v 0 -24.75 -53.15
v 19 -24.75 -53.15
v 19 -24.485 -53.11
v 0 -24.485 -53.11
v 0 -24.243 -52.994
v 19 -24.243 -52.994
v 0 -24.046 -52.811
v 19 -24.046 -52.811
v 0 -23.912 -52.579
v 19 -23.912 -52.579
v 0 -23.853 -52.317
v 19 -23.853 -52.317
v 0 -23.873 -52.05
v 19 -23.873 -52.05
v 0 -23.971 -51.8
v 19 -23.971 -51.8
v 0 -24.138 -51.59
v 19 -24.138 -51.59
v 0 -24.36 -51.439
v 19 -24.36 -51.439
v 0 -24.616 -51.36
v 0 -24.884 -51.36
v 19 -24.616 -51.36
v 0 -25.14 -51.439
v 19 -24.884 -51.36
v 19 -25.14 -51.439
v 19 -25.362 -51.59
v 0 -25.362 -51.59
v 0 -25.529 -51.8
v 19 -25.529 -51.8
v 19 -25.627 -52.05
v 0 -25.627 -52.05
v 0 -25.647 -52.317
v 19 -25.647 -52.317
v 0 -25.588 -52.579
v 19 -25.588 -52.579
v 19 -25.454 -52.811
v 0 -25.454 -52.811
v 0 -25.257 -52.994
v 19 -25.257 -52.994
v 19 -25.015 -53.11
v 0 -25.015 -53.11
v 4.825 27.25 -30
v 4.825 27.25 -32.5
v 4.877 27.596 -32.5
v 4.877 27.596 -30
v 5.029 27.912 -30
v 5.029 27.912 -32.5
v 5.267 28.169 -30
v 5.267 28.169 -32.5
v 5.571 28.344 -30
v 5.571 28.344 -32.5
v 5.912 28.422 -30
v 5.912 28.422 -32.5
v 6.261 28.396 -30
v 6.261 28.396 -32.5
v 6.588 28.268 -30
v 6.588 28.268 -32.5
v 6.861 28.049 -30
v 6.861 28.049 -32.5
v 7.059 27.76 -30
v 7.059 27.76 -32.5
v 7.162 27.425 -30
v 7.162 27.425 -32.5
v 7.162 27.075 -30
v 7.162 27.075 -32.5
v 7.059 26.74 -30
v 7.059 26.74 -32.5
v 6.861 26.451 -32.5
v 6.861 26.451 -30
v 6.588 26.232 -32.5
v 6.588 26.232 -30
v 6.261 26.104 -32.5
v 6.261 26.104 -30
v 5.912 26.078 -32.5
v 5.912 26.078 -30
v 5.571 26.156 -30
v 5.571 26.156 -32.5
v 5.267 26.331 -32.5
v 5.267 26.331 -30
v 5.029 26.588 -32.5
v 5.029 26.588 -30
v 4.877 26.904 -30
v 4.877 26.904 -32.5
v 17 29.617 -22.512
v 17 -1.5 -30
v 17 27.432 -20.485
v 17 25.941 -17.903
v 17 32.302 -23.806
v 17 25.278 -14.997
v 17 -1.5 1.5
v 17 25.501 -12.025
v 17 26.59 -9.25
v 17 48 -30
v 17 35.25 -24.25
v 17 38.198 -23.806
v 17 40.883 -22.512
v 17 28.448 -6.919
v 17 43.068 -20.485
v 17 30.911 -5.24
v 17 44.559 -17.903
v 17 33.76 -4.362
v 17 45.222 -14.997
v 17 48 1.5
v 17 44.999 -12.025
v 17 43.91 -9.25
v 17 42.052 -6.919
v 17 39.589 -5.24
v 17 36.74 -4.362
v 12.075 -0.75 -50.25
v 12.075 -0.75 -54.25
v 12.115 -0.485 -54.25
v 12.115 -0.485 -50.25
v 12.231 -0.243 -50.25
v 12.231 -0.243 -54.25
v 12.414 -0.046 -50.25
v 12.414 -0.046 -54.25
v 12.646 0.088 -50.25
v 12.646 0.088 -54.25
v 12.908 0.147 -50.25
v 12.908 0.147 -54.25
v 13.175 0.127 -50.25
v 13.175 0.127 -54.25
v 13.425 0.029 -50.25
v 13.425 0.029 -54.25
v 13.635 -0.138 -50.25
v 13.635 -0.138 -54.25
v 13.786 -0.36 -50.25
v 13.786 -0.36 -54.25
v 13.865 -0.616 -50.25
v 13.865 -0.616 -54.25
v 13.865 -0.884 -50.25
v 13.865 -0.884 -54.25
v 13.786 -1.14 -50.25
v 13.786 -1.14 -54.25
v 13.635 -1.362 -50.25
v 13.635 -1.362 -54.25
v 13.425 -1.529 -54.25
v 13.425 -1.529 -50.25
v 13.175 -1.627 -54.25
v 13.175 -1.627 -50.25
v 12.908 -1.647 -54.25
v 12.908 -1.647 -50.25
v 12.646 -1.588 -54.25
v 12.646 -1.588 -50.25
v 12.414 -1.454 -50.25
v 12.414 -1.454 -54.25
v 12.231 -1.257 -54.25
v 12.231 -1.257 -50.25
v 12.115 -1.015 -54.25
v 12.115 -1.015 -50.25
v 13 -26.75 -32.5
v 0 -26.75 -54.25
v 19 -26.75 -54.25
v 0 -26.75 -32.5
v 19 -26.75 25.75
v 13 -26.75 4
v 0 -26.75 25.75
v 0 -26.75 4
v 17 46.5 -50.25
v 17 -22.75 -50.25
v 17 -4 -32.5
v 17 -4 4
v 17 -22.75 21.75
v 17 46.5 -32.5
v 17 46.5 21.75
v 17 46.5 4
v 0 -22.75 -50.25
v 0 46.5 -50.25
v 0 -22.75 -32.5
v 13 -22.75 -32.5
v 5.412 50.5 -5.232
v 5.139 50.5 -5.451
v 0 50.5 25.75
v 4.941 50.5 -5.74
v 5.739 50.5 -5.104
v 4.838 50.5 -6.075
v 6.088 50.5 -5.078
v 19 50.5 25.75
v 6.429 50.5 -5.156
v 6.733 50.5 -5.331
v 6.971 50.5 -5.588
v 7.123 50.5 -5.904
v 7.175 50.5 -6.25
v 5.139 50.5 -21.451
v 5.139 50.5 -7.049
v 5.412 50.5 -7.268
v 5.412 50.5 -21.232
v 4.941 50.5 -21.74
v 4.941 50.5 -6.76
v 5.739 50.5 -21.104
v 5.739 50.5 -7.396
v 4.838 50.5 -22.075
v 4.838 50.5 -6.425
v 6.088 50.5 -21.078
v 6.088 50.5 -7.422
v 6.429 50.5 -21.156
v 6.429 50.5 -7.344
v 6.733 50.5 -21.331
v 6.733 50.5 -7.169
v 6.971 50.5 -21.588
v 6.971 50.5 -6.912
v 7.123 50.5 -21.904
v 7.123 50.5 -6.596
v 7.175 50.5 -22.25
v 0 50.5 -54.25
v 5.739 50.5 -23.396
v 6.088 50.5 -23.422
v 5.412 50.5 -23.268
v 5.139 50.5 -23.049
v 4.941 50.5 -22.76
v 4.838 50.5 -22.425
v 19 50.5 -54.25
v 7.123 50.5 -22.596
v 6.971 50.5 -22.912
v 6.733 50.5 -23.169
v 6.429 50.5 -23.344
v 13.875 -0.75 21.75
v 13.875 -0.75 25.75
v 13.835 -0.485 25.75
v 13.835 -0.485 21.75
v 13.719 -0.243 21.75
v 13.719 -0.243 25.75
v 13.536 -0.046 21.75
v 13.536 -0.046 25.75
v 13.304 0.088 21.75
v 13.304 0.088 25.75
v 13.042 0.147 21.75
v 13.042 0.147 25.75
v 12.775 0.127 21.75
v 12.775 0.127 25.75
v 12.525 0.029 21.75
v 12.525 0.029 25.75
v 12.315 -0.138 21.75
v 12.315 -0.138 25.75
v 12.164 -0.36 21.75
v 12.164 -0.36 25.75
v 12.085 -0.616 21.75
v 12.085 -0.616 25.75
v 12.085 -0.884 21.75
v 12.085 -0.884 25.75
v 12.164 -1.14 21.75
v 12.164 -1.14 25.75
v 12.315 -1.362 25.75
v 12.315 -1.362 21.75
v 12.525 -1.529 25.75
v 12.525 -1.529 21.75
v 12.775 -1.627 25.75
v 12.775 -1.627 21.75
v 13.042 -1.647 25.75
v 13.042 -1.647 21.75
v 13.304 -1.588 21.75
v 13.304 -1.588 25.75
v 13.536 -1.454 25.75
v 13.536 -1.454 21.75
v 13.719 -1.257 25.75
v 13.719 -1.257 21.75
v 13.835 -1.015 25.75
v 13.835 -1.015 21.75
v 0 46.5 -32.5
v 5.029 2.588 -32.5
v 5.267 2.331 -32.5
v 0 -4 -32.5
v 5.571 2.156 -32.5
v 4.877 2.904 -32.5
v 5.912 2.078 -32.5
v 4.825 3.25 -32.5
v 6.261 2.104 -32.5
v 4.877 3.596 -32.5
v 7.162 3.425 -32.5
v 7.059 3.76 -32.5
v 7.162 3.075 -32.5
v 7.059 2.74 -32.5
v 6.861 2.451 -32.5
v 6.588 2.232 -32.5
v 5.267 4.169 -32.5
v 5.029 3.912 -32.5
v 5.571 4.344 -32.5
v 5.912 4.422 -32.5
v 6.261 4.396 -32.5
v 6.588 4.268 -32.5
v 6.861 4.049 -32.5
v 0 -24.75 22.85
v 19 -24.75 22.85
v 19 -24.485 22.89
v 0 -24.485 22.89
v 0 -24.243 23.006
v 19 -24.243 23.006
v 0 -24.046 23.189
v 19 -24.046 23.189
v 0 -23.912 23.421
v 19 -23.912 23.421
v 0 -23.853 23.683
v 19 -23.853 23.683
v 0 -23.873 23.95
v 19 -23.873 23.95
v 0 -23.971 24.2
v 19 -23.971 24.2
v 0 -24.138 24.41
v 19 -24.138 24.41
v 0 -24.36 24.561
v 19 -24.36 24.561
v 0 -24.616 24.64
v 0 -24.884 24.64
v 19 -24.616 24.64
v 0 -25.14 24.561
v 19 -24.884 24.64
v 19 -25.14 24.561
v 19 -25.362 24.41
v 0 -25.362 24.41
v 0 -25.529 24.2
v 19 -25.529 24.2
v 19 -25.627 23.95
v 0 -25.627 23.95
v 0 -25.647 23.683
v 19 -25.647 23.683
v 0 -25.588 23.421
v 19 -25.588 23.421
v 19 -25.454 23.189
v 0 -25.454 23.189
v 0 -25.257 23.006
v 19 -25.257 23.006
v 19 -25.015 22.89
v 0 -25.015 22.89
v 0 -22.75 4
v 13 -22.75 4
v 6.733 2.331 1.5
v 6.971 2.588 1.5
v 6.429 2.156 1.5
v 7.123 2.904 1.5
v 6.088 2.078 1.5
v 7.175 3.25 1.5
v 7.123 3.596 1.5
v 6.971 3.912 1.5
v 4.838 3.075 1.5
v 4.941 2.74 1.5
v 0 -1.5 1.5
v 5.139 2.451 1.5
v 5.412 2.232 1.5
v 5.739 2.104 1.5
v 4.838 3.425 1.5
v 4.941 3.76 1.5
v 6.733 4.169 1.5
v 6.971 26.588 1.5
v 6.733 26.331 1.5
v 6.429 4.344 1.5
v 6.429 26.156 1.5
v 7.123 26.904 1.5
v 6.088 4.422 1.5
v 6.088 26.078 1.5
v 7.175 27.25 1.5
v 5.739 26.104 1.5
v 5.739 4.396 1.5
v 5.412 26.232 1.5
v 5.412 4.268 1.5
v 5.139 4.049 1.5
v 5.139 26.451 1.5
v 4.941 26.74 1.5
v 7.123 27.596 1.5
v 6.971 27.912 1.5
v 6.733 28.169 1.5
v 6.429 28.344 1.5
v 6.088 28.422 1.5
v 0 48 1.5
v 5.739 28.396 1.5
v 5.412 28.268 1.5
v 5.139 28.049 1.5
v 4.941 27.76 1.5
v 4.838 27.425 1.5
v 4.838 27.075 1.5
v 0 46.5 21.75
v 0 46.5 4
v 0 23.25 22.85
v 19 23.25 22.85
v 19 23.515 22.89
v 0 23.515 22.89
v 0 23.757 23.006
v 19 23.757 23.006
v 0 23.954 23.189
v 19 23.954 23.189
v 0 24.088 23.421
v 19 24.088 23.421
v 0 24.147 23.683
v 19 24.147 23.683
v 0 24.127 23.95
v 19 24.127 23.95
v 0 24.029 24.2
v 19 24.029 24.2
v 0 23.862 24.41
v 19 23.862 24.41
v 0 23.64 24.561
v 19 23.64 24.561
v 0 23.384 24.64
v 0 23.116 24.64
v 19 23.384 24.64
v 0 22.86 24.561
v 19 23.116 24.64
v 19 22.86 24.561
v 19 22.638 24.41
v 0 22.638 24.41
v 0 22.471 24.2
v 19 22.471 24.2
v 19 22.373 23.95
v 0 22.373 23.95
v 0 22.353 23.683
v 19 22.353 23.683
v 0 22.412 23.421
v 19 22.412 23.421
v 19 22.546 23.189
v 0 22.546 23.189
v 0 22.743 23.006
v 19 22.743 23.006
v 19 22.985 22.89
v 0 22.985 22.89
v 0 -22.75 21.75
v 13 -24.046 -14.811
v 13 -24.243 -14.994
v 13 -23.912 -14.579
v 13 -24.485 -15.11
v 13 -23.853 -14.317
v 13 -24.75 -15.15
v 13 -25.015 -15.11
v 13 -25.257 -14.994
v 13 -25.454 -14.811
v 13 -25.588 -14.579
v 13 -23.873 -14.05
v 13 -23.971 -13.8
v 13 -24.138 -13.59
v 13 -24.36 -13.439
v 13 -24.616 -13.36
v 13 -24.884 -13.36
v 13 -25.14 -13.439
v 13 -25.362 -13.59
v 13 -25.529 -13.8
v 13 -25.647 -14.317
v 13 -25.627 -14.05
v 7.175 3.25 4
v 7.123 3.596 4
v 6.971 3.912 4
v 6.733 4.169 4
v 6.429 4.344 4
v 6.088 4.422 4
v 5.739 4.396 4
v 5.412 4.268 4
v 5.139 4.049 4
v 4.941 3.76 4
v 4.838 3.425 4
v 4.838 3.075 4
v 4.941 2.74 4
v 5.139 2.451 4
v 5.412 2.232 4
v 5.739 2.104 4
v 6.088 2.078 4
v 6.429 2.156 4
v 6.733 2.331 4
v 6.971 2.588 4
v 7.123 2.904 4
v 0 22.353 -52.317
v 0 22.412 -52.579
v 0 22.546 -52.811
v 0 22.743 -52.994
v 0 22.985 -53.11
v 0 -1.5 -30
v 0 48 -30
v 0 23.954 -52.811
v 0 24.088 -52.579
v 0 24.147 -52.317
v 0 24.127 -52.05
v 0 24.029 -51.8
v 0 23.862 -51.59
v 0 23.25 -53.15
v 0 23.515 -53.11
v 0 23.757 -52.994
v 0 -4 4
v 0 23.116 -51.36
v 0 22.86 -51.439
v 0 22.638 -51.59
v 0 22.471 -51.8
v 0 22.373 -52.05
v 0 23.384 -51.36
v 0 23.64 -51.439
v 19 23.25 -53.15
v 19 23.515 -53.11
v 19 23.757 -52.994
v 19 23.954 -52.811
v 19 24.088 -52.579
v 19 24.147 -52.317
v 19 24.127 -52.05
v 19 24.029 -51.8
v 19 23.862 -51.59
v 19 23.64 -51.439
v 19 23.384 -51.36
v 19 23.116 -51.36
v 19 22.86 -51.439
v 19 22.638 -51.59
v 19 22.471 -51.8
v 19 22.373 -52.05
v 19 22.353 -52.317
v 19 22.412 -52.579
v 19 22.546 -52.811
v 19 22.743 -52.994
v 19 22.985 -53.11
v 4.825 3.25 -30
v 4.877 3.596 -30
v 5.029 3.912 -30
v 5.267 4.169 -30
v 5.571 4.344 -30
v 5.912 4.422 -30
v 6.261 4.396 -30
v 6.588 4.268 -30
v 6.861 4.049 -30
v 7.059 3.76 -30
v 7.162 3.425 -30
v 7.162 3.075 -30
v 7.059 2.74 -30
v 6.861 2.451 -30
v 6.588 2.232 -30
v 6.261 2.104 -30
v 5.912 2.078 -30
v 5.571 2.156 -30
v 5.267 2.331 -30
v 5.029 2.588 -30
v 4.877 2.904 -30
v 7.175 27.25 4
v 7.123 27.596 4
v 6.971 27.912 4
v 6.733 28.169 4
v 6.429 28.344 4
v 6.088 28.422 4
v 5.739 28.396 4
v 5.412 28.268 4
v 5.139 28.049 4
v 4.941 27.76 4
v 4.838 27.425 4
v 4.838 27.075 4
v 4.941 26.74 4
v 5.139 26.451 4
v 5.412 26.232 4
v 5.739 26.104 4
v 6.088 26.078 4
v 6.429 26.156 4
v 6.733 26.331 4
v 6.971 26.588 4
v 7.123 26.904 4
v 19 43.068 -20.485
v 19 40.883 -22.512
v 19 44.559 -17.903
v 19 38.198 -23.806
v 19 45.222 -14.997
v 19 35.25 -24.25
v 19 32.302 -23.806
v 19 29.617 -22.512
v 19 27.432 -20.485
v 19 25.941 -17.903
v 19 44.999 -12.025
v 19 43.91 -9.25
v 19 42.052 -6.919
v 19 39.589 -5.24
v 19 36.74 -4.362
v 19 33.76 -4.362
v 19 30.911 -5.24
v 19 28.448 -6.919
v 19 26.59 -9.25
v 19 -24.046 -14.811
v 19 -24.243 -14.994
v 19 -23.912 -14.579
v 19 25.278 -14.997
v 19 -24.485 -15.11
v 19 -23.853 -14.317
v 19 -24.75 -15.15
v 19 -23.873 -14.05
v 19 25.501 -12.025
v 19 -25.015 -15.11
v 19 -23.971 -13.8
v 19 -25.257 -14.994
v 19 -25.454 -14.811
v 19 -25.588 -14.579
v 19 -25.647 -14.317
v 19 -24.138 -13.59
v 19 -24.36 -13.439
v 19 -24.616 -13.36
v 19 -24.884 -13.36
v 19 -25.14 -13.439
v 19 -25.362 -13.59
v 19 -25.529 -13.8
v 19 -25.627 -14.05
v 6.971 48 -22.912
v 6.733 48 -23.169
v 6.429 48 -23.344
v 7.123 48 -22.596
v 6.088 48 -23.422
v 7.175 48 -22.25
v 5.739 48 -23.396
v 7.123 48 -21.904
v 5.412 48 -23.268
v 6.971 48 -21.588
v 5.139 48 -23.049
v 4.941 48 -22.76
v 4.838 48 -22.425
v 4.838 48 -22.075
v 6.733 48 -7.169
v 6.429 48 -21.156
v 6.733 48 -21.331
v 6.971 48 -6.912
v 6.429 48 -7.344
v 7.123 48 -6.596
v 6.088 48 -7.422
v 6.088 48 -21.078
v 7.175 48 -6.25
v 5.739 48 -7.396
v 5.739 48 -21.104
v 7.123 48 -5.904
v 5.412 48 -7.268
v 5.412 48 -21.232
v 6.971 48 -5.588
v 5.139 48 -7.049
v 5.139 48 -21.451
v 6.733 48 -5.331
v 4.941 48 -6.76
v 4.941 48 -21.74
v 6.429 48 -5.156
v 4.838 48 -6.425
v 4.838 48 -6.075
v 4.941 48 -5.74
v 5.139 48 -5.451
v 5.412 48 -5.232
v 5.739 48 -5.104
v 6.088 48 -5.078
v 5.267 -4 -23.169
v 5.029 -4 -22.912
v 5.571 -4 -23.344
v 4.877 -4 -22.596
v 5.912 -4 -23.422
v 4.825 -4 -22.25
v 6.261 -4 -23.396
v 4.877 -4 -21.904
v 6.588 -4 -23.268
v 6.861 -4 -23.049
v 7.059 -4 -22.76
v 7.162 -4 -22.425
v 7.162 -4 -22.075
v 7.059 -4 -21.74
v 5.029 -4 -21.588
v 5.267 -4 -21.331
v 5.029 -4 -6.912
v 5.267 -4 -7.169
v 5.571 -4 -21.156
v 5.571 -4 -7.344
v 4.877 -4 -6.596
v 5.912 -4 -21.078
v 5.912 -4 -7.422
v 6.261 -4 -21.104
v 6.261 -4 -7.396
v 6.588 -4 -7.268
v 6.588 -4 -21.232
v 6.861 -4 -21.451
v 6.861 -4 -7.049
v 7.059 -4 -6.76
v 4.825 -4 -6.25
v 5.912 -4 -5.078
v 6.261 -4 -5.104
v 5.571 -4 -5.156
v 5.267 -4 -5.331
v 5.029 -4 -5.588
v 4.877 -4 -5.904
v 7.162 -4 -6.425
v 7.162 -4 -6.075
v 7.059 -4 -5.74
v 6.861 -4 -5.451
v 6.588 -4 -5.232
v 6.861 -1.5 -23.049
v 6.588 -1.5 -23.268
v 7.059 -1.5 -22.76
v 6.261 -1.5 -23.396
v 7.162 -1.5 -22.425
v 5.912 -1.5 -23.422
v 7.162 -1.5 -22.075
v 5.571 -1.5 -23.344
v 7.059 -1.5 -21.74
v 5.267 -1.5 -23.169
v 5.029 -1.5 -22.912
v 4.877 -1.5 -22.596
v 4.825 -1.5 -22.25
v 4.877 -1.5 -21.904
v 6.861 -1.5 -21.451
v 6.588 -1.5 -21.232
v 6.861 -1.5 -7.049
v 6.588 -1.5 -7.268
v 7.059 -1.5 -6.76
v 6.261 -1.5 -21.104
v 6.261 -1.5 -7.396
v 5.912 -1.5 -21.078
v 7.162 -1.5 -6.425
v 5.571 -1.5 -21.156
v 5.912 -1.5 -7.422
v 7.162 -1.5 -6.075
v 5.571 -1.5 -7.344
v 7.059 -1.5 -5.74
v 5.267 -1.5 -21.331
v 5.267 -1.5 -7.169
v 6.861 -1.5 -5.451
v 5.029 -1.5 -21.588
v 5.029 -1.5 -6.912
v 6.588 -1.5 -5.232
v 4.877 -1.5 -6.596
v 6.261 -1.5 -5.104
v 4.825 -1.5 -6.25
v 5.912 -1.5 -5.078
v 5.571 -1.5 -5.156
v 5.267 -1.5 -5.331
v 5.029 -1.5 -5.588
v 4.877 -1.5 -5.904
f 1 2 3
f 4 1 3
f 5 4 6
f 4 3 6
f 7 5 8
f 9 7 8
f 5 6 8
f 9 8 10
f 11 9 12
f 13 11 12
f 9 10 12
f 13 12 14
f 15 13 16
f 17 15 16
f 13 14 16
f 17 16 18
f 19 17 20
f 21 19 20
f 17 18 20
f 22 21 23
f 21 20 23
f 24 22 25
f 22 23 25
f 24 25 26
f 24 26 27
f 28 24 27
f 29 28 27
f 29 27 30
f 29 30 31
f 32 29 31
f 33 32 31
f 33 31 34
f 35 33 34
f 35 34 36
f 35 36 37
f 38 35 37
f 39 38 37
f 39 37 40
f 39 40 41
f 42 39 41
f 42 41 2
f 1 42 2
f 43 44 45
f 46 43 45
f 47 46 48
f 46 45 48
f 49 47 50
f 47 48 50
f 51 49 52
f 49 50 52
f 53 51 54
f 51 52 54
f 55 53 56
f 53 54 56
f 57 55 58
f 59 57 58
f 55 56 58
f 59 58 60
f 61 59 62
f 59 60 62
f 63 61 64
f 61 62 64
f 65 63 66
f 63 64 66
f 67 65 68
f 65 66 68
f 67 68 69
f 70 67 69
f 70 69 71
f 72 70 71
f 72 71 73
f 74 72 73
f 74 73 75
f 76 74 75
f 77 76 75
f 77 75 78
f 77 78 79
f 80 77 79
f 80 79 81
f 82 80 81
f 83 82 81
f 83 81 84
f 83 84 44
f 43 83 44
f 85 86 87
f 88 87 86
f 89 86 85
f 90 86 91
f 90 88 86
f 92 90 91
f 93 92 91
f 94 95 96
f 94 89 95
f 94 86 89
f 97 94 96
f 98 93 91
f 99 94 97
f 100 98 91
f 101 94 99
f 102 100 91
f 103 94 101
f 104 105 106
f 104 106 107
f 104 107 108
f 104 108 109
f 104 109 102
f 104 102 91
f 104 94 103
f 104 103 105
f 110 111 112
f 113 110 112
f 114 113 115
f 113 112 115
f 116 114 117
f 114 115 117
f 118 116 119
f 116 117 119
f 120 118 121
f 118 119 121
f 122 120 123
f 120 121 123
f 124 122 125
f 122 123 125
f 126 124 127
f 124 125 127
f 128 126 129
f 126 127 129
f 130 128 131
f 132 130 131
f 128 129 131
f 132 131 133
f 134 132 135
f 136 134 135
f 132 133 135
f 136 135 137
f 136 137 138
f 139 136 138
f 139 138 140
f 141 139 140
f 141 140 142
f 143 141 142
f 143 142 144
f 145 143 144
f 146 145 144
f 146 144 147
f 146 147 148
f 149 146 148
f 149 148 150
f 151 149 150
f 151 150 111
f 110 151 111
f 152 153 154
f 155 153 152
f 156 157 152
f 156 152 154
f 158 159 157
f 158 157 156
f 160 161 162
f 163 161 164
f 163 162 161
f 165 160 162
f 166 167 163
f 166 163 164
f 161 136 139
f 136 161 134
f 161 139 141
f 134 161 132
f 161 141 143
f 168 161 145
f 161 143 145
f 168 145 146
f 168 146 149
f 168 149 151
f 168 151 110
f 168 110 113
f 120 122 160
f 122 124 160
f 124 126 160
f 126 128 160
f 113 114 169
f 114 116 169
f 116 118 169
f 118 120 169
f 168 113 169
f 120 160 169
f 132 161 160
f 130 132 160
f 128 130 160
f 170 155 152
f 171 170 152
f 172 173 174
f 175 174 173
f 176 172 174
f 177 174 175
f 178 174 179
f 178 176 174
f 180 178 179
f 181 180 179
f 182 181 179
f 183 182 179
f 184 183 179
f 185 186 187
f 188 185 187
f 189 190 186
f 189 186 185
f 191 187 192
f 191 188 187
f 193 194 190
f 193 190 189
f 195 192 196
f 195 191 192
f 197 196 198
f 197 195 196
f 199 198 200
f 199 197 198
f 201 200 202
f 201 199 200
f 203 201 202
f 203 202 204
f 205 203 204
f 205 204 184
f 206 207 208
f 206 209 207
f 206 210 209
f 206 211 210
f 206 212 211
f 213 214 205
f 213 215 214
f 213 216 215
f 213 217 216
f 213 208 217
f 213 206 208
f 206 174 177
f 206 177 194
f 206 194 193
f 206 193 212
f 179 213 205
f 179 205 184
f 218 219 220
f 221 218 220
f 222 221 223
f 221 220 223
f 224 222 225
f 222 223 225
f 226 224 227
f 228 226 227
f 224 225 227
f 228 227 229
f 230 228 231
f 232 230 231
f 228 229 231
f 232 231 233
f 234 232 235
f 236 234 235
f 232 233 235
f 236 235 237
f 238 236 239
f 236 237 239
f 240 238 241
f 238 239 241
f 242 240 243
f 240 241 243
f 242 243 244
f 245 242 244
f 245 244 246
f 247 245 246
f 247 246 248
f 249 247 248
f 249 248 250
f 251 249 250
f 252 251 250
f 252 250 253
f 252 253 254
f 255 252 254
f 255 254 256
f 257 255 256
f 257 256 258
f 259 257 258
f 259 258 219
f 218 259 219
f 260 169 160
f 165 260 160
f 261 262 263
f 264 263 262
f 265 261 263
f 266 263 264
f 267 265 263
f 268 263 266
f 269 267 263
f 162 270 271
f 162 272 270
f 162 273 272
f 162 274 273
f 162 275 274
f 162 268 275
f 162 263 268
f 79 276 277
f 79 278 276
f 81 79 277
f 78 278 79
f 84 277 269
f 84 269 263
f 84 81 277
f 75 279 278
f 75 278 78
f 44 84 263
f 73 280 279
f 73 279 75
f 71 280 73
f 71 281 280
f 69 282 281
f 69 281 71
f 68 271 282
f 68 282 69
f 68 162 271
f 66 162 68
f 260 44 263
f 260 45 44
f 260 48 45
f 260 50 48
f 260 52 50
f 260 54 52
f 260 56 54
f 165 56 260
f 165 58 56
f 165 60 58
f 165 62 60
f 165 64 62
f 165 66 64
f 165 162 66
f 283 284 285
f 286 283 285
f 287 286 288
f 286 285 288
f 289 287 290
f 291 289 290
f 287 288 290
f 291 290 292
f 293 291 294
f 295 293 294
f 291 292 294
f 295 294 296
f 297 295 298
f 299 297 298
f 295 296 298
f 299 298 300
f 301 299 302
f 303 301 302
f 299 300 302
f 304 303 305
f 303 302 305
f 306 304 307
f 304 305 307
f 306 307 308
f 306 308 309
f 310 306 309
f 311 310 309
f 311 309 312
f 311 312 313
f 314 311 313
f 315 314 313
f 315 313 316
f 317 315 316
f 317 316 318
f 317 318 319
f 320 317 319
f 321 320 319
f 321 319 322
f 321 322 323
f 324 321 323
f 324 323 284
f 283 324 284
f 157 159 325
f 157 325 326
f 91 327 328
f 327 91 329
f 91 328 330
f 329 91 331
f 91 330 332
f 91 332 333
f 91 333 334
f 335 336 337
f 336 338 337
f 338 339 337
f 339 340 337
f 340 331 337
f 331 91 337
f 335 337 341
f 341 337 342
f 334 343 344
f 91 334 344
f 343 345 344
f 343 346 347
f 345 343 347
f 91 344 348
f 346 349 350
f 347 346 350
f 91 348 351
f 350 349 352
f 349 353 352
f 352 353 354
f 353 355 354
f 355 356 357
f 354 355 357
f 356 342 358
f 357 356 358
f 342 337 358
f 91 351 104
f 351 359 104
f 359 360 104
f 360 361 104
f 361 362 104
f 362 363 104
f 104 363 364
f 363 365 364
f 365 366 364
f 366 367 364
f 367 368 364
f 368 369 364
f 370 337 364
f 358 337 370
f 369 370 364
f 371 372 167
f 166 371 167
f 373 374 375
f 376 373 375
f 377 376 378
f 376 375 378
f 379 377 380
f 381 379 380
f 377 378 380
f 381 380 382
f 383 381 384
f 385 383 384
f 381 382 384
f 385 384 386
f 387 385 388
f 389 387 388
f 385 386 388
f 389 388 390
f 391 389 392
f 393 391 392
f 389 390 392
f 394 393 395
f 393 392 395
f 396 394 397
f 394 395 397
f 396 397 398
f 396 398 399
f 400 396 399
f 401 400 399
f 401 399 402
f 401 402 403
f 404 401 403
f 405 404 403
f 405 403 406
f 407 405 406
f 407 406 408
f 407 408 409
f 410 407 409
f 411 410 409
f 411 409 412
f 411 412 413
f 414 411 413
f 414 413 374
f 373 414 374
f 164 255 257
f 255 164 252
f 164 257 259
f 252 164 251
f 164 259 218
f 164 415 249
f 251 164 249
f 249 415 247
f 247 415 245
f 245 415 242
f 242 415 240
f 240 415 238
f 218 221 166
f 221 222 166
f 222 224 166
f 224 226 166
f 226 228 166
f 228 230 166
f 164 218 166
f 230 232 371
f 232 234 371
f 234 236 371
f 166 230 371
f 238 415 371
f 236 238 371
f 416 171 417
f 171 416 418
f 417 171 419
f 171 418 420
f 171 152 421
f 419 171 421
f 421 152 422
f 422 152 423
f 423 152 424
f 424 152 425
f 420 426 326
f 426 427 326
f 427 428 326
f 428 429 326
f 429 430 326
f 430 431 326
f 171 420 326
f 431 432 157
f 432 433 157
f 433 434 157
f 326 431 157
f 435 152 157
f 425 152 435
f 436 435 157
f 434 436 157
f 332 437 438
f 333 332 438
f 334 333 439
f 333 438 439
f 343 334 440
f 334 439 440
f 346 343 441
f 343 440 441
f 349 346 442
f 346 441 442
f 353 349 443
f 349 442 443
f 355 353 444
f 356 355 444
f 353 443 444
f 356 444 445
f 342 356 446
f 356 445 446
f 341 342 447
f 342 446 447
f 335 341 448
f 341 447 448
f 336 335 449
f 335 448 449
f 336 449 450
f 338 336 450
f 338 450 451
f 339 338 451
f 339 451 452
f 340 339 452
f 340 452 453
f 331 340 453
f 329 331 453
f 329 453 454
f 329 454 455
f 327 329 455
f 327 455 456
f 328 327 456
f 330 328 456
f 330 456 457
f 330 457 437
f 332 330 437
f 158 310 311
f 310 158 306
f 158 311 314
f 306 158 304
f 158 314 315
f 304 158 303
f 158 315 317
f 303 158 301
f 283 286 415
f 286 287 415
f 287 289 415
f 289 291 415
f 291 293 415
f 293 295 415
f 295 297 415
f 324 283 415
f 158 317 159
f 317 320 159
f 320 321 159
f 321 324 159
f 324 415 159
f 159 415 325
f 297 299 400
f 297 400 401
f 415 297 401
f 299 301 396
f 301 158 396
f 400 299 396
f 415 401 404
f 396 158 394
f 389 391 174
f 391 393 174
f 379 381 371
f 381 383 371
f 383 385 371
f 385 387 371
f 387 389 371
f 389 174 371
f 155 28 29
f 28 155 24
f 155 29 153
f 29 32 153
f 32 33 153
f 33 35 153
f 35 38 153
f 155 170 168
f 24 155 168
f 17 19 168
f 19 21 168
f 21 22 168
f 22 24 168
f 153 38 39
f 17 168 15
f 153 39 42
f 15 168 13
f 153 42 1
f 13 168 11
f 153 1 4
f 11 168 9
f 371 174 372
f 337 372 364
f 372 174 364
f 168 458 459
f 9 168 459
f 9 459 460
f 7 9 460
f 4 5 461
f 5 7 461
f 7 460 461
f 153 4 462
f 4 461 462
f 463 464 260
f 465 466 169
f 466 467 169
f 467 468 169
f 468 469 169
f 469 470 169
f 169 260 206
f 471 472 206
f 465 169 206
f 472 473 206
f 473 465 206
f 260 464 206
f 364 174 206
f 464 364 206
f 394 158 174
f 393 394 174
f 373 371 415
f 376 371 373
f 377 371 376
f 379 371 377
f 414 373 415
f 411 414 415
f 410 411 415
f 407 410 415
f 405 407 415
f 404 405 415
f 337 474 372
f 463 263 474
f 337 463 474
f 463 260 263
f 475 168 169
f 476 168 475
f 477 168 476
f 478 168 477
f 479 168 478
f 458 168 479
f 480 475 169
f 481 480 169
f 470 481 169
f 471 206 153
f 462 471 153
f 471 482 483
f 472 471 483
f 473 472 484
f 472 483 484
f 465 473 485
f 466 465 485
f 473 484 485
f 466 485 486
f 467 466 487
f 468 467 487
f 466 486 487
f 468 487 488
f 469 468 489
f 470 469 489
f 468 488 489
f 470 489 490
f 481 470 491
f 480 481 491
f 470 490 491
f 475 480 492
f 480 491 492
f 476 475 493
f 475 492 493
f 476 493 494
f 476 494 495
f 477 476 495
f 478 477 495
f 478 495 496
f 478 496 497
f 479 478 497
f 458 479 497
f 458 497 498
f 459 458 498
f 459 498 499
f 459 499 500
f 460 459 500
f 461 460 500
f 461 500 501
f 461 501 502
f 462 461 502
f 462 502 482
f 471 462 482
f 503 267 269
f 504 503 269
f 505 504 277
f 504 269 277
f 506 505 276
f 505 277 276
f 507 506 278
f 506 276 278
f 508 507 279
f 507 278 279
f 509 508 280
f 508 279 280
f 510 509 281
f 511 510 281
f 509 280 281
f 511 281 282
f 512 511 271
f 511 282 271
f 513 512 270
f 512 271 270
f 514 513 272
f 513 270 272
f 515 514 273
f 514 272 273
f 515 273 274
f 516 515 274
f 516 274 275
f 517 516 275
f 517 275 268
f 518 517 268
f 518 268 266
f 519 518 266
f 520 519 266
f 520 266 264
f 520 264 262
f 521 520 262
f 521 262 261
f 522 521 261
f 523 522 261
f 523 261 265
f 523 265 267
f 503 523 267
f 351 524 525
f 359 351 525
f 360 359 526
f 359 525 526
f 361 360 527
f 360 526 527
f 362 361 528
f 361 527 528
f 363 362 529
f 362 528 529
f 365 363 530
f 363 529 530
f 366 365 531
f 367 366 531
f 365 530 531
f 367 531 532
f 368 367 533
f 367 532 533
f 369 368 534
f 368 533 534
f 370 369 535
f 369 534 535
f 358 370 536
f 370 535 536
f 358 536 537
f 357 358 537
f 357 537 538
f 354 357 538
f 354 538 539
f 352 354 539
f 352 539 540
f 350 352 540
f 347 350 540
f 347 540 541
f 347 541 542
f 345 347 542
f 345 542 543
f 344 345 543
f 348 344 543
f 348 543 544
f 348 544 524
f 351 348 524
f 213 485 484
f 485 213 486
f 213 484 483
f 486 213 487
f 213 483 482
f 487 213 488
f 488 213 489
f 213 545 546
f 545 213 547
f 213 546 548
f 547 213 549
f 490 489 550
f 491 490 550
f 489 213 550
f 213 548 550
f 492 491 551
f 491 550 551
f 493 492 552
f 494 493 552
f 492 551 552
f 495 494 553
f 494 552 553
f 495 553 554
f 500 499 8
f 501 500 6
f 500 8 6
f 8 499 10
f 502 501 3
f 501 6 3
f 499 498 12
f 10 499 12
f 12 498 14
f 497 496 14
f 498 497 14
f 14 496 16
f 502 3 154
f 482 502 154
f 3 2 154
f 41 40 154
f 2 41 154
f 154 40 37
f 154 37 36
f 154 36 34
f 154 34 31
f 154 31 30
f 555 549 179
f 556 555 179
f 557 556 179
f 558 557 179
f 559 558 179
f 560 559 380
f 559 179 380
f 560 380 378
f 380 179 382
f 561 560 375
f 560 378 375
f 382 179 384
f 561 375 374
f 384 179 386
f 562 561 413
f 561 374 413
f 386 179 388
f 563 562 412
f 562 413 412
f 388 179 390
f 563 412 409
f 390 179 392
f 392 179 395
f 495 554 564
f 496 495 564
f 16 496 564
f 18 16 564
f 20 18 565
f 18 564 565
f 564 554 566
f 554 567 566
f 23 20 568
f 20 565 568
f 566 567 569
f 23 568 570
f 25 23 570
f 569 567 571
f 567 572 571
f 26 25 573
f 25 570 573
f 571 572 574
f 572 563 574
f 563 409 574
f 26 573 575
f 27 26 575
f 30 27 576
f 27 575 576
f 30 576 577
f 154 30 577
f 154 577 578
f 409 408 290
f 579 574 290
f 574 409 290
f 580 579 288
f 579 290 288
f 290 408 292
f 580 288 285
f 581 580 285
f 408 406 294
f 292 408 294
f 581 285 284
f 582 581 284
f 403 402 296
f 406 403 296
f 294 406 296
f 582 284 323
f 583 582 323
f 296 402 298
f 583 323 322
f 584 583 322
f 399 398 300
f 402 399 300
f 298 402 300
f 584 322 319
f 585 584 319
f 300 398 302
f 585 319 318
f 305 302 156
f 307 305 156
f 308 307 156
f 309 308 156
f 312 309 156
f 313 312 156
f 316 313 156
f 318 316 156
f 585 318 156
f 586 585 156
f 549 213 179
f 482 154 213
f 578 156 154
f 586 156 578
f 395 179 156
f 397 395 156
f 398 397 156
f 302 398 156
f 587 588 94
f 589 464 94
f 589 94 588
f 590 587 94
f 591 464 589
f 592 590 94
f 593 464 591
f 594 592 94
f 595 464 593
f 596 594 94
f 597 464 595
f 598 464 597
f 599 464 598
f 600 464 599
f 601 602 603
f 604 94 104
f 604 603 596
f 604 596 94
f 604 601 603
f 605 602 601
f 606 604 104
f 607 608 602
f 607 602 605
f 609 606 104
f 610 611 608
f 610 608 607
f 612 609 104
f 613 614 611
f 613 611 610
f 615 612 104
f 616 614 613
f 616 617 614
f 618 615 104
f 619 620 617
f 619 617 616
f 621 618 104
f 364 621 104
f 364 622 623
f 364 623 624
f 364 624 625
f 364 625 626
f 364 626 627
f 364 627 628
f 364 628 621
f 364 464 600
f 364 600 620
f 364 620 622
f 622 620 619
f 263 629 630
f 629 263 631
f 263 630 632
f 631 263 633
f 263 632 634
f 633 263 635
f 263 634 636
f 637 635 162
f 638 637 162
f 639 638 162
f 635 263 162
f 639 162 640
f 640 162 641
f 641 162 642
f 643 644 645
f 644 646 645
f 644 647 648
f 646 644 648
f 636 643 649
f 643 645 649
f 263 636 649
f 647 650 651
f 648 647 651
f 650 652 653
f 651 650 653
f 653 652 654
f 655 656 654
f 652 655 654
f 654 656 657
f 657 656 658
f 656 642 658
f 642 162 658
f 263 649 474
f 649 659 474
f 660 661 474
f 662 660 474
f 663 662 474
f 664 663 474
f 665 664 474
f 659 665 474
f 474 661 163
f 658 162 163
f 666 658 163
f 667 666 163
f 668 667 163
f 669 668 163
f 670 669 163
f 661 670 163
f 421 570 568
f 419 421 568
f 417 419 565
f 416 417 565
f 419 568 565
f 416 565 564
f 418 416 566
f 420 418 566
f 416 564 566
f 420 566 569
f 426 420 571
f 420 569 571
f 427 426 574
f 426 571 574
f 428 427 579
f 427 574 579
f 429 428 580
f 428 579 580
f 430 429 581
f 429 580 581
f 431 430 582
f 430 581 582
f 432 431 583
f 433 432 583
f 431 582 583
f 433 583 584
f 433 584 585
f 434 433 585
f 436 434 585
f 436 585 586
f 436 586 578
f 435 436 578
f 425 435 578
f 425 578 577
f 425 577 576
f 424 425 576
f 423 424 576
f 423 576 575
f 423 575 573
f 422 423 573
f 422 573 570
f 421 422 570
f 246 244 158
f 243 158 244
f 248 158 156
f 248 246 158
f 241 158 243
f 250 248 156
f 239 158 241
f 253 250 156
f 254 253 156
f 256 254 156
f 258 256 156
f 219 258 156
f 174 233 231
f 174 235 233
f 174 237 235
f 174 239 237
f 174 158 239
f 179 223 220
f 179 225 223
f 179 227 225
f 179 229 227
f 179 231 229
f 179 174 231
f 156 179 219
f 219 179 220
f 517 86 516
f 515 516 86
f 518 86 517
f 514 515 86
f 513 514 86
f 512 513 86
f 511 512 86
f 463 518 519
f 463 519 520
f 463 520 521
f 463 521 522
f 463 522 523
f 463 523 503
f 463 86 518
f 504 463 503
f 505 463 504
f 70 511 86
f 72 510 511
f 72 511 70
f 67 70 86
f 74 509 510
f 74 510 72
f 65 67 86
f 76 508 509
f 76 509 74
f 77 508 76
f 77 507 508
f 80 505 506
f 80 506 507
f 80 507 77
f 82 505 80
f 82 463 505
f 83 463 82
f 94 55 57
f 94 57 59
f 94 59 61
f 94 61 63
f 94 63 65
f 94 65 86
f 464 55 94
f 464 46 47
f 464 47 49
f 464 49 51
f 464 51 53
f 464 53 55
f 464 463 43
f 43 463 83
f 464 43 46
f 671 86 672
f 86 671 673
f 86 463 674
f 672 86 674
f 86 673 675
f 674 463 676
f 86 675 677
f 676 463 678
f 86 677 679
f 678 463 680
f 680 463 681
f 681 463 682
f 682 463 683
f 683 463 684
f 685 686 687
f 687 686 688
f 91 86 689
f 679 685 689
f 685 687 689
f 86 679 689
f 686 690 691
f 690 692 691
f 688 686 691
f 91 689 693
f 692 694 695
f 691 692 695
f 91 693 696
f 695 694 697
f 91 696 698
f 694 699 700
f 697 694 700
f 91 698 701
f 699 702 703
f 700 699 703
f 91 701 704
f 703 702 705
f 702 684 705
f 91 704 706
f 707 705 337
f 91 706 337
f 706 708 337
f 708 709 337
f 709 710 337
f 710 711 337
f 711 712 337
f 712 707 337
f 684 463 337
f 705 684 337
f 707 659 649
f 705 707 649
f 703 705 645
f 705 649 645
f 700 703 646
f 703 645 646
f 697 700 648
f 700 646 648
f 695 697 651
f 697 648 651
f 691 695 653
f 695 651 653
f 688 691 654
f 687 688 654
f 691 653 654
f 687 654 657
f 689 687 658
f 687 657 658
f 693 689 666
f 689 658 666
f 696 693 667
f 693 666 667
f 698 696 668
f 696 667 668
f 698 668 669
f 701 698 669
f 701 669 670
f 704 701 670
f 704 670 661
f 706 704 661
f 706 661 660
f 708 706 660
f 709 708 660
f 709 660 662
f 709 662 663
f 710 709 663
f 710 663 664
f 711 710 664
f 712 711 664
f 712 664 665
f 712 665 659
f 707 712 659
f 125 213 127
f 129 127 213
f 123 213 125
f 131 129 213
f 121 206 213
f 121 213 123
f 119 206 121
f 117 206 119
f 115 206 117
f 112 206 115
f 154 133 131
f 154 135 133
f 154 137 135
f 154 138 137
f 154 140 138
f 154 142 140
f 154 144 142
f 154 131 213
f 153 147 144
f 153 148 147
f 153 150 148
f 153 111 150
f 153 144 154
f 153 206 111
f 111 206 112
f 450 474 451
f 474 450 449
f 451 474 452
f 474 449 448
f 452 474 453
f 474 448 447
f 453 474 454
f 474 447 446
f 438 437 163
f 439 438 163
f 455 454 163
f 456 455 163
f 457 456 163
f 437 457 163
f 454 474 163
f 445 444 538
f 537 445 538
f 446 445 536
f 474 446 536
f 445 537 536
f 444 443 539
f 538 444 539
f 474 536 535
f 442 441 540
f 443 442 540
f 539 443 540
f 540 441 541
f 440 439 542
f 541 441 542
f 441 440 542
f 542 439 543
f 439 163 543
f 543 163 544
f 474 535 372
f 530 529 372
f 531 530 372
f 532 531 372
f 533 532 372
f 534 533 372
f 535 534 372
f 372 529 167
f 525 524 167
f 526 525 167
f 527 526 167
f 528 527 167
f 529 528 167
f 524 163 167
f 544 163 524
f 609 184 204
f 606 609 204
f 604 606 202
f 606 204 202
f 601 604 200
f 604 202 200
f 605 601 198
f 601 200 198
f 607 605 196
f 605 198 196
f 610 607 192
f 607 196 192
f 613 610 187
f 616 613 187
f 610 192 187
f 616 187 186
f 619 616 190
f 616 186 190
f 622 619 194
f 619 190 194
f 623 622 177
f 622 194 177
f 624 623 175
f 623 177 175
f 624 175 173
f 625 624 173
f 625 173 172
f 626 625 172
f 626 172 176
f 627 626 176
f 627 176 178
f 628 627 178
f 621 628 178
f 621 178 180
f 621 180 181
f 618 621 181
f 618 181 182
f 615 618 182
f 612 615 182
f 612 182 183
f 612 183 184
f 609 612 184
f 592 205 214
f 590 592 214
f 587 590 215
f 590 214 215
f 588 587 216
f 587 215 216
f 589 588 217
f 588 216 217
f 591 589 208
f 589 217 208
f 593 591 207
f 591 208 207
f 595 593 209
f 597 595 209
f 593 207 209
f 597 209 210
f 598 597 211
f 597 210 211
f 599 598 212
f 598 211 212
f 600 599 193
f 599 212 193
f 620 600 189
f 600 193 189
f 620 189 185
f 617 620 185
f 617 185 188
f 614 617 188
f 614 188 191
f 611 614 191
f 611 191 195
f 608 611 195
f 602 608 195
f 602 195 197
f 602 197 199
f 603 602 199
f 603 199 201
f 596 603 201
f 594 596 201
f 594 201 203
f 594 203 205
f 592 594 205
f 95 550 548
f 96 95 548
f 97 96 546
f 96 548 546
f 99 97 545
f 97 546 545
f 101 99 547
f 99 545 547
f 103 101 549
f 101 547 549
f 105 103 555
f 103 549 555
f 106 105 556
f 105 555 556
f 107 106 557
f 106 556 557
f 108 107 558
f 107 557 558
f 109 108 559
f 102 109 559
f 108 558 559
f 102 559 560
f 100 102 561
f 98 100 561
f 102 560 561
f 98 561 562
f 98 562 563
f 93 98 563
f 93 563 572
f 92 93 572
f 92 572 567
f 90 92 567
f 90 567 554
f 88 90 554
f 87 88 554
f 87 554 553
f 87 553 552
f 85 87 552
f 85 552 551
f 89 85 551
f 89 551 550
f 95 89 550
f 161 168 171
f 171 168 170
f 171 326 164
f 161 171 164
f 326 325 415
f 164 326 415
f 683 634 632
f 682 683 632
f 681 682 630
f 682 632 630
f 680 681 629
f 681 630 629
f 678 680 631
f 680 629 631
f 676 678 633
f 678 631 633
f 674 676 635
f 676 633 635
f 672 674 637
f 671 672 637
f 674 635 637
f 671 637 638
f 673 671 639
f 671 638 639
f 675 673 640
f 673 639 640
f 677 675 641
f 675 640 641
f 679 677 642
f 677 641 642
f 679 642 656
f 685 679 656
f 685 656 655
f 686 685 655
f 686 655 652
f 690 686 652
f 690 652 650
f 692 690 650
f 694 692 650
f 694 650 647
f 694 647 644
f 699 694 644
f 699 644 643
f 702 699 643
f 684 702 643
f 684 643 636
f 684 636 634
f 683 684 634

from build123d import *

# Parameters (mm, degrees)
SKETCH_1_W                    = 100
SKETCH_1_H                    = 80
EXTRUDE_1_DEPTH               = 19
SKETCH_2_W                    = 72
SKETCH_2_H                    = 92
CUT_EXTRUDE_1_DEPTH           = 17
SKETCH_3_W                    = 36.5
SKETCH_3_H                    = 54.5
EXTRUDE_2_DEPTH               = 17
SKETCH_4_W                    = 31.5
SKETCH_4_H                    = 49.5
CUT_EXTRUDE_2_DEPTH           = 17
HOLE_WIZARD_20_0_20_1_D       = 20
HOLE_WIZARD_20_0_20_1_DEPTH   = 2
HOLE_WIZARD_1_8_1_8_1_D       = 1.8
HOLE_WIZARD_1_8_1_8_2_D       = 1.8
HOLE_WIZARD_1_8_1_8_2_DEPTH   = 4
HOLE_WIZARD_1_8_1_8_3_D       = 1.8
HOLE_WIZARD_1_8_1_8_3_DEPTH   = 4
HOLE_WIZARD_2_35_2_35_1_D     = 2.35
HOLE_WIZARD_2_35_2_35_1_DEPTH = 2.5
HOLE_WIZARD_2_35_2_35_2_D     = 2.35
HOLE_WIZARD_2_35_2_35_2_DEPTH = 2.5
HOLE_WIZARD_2_35_2_35_3_D     = 2.35
HOLE_WIZARD_2_35_2_35_3_DEPTH = 2.5
HOLE_WIZARD_2_35_2_35_4_D     = 2.35
HOLE_WIZARD_2_35_2_35_4_DEPTH = 2.5
SKETCH_22_W                   = 13
SKETCH_22_H                   = 36.5
CUT_EXTRUDE_5_DEPTH           = 10
SKETCH_23_W                   = 80
SKETCH_23_H                   = 22.75
CUT_EXTRUDE_6_DEPTH           = 19
SKETCH_24_W                   = 17
SKETCH_24_H                   = 17.75
EXTRUDE_3_DEPTH               = 4
SKETCH_25_R                   = 0.9
EXTRUDE_4_DEPTH               = 4
EXTRUDE_START                 = -4
SKETCH_26_R                   = 0.9
EXTRUDE_5_DEPTH               = 4


with BuildPart() as part:
    # 스케치1 → 보스-돌출1 (new body)
    with BuildSketch(Plane(origin=(0, 0, 0), x_dir=(0, -1, 0), z_dir=(-1, 0, 0))):
        with Locations((-23.25, -14.25)):
            Rectangle(SKETCH_1_W, SKETCH_1_H)
    extrude(amount=-EXTRUDE_1_DEPTH)

    # 스케치2 → 컷-돌출1 (cut)
    with BuildSketch(Plane.ZY):
        with Locations((-14.25, 23.25)):
            Rectangle(SKETCH_2_W, SKETCH_2_H)
    extrude(amount=-CUT_EXTRUDE_1_DEPTH, mode=Mode.SUBTRACT)

    # 스케치3 → 보스-돌출2 (add)
    with BuildSketch(Plane.ZY.offset(-17)):
        with Locations((-14.25, 23.25)):
            Rectangle(SKETCH_3_W, SKETCH_3_H)
    extrude(amount=EXTRUDE_2_DEPTH)

    # 스케치4 → 컷-돌출2 (cut)
    with BuildSketch(Plane.ZY):
        with Locations((-14.25, 23.25)):
            Rectangle(SKETCH_4_W, SKETCH_4_H)
    extrude(amount=-CUT_EXTRUDE_2_DEPTH, mode=Mode.SUBTRACT)

    # Ø20.0 (20) 지름 구멍1
    with Locations(Plane.ZY.offset(-17)):
        with Locations((-14.25, 35.25)):
            Hole(HOLE_WIZARD_20_0_20_1_D / 2, depth=HOLE_WIZARD_20_0_20_1_DEPTH)

    # Ø1.8 (1.8) 지름 구멍1 (through all)
    with Locations(Plane.ZY):
        with Locations((-52.25, 71.25), (-14.25, 71.25), (23.75, 71.25), (23.75, -24.75), (-14.25, -24.75), (-52.25, -24.75), (-52.25, 23.25), (23.75, 23.25)):
            Hole(HOLE_WIZARD_1_8_1_8_1_D / 2)

    # Ø1.8 (1.8) 지름 구멍2
    with Locations(Plane.XY.offset(-50.25)):
        with Locations((12.975, -0.75), (12.975, 47.25)):
            Hole(HOLE_WIZARD_1_8_1_8_2_D / 2, depth=HOLE_WIZARD_1_8_1_8_2_DEPTH)

    # Ø1.8 (1.8) 지름 구멍3
    with Locations(Plane(origin=(0, 0, 21.75), x_dir=(-1, 0, 0), z_dir=(0, 0, -1))):
        with Locations((-12.975, -0.75), (-12.975, 47.25)):
            Hole(HOLE_WIZARD_1_8_1_8_3_D / 2, depth=HOLE_WIZARD_1_8_1_8_3_DEPTH)

    # Ø2.35 (2.35) 지름 구멍1
    with Locations(Plane(origin=(0, -1.5, 0), x_dir=(1, 0, 0), z_dir=(0, 1, 0))):
        with Locations((6, 6.25), (6, 22.25)):
            Hole(HOLE_WIZARD_2_35_2_35_1_D / 2, depth=HOLE_WIZARD_2_35_2_35_1_DEPTH)

    # Ø2.35 (2.35) 지름 구멍2
    with Locations(Plane.XY.offset(-30)):
        with Locations((6, 27.25), (6, 3.25)):
            Hole(HOLE_WIZARD_2_35_2_35_2_D / 2, depth=HOLE_WIZARD_2_35_2_35_2_DEPTH)

    # Ø2.35 (2.35) 지름 구멍3
    with Locations(Plane(origin=(0, 48, 0), x_dir=(-1, 0, 0), z_dir=(0, -1, 0))):
        with Locations((-6, 6.25), (-6, 22.25)):
            Hole(HOLE_WIZARD_2_35_2_35_3_D / 2, depth=HOLE_WIZARD_2_35_2_35_3_DEPTH)

    # Ø2.35 (2.35) 지름 구멍4
    with Locations(Plane(origin=(0, 0, 1.5), x_dir=(-1, 0, 0), z_dir=(0, 0, -1))):
        with Locations((-6, 27.25), (-6, 3.25)):
            Hole(HOLE_WIZARD_2_35_2_35_4_D / 2, depth=HOLE_WIZARD_2_35_2_35_4_DEPTH)

    # 스케치22 → 컷-돌출5 (cut)
    with BuildSketch(Plane.XZ.offset(26.75)):
        with Locations((6.5, -14.25)):
            Rectangle(SKETCH_22_W, SKETCH_22_H)
    extrude(amount=-CUT_EXTRUDE_5_DEPTH, mode=Mode.SUBTRACT)

    # 스케치23 → 컷-돌출6 (cut)
    with BuildSketch(Plane.ZY):
        with Locations((-14.25, 61.875)):
            Rectangle(SKETCH_23_W, SKETCH_23_H)
    extrude(amount=-CUT_EXTRUDE_6_DEPTH, mode=Mode.SUBTRACT)

    # 스케치24 → 보스-돌출3 (add)
    with BuildSketch(Plane(origin=(0, 50.5, 0), x_dir=(1, 0, 0), z_dir=(0, 1, 0))):
        with Locations((8.5, -12.875)):
            Rectangle(SKETCH_24_W, SKETCH_24_H)
        with Locations((8.5, 41.375)):
            Rectangle(SKETCH_24_W, SKETCH_24_H)
    extrude(amount=-EXTRUDE_3_DEPTH)

    # 스케치25 → 보스-돌출4 (add)
    with BuildSketch(Plane.XY.offset(25.75)):
        with Locations((12.975, 47.25)):
            Circle(SKETCH_25_R)
    extrude(amount=-EXTRUDE_4_DEPTH)

    # 스케치26 → 보스-돌출5 (add)
    with BuildSketch(Plane(origin=(0, 0, -54.25), x_dir=(-1, 0, 0), z_dir=(0, 0, -1)).offset(EXTRUDE_START)):
        with Locations((-12.975, 47.25)):
            Circle(SKETCH_26_R)
    extrude(amount=EXTRUDE_5_DEPTH)


solid = part.part
